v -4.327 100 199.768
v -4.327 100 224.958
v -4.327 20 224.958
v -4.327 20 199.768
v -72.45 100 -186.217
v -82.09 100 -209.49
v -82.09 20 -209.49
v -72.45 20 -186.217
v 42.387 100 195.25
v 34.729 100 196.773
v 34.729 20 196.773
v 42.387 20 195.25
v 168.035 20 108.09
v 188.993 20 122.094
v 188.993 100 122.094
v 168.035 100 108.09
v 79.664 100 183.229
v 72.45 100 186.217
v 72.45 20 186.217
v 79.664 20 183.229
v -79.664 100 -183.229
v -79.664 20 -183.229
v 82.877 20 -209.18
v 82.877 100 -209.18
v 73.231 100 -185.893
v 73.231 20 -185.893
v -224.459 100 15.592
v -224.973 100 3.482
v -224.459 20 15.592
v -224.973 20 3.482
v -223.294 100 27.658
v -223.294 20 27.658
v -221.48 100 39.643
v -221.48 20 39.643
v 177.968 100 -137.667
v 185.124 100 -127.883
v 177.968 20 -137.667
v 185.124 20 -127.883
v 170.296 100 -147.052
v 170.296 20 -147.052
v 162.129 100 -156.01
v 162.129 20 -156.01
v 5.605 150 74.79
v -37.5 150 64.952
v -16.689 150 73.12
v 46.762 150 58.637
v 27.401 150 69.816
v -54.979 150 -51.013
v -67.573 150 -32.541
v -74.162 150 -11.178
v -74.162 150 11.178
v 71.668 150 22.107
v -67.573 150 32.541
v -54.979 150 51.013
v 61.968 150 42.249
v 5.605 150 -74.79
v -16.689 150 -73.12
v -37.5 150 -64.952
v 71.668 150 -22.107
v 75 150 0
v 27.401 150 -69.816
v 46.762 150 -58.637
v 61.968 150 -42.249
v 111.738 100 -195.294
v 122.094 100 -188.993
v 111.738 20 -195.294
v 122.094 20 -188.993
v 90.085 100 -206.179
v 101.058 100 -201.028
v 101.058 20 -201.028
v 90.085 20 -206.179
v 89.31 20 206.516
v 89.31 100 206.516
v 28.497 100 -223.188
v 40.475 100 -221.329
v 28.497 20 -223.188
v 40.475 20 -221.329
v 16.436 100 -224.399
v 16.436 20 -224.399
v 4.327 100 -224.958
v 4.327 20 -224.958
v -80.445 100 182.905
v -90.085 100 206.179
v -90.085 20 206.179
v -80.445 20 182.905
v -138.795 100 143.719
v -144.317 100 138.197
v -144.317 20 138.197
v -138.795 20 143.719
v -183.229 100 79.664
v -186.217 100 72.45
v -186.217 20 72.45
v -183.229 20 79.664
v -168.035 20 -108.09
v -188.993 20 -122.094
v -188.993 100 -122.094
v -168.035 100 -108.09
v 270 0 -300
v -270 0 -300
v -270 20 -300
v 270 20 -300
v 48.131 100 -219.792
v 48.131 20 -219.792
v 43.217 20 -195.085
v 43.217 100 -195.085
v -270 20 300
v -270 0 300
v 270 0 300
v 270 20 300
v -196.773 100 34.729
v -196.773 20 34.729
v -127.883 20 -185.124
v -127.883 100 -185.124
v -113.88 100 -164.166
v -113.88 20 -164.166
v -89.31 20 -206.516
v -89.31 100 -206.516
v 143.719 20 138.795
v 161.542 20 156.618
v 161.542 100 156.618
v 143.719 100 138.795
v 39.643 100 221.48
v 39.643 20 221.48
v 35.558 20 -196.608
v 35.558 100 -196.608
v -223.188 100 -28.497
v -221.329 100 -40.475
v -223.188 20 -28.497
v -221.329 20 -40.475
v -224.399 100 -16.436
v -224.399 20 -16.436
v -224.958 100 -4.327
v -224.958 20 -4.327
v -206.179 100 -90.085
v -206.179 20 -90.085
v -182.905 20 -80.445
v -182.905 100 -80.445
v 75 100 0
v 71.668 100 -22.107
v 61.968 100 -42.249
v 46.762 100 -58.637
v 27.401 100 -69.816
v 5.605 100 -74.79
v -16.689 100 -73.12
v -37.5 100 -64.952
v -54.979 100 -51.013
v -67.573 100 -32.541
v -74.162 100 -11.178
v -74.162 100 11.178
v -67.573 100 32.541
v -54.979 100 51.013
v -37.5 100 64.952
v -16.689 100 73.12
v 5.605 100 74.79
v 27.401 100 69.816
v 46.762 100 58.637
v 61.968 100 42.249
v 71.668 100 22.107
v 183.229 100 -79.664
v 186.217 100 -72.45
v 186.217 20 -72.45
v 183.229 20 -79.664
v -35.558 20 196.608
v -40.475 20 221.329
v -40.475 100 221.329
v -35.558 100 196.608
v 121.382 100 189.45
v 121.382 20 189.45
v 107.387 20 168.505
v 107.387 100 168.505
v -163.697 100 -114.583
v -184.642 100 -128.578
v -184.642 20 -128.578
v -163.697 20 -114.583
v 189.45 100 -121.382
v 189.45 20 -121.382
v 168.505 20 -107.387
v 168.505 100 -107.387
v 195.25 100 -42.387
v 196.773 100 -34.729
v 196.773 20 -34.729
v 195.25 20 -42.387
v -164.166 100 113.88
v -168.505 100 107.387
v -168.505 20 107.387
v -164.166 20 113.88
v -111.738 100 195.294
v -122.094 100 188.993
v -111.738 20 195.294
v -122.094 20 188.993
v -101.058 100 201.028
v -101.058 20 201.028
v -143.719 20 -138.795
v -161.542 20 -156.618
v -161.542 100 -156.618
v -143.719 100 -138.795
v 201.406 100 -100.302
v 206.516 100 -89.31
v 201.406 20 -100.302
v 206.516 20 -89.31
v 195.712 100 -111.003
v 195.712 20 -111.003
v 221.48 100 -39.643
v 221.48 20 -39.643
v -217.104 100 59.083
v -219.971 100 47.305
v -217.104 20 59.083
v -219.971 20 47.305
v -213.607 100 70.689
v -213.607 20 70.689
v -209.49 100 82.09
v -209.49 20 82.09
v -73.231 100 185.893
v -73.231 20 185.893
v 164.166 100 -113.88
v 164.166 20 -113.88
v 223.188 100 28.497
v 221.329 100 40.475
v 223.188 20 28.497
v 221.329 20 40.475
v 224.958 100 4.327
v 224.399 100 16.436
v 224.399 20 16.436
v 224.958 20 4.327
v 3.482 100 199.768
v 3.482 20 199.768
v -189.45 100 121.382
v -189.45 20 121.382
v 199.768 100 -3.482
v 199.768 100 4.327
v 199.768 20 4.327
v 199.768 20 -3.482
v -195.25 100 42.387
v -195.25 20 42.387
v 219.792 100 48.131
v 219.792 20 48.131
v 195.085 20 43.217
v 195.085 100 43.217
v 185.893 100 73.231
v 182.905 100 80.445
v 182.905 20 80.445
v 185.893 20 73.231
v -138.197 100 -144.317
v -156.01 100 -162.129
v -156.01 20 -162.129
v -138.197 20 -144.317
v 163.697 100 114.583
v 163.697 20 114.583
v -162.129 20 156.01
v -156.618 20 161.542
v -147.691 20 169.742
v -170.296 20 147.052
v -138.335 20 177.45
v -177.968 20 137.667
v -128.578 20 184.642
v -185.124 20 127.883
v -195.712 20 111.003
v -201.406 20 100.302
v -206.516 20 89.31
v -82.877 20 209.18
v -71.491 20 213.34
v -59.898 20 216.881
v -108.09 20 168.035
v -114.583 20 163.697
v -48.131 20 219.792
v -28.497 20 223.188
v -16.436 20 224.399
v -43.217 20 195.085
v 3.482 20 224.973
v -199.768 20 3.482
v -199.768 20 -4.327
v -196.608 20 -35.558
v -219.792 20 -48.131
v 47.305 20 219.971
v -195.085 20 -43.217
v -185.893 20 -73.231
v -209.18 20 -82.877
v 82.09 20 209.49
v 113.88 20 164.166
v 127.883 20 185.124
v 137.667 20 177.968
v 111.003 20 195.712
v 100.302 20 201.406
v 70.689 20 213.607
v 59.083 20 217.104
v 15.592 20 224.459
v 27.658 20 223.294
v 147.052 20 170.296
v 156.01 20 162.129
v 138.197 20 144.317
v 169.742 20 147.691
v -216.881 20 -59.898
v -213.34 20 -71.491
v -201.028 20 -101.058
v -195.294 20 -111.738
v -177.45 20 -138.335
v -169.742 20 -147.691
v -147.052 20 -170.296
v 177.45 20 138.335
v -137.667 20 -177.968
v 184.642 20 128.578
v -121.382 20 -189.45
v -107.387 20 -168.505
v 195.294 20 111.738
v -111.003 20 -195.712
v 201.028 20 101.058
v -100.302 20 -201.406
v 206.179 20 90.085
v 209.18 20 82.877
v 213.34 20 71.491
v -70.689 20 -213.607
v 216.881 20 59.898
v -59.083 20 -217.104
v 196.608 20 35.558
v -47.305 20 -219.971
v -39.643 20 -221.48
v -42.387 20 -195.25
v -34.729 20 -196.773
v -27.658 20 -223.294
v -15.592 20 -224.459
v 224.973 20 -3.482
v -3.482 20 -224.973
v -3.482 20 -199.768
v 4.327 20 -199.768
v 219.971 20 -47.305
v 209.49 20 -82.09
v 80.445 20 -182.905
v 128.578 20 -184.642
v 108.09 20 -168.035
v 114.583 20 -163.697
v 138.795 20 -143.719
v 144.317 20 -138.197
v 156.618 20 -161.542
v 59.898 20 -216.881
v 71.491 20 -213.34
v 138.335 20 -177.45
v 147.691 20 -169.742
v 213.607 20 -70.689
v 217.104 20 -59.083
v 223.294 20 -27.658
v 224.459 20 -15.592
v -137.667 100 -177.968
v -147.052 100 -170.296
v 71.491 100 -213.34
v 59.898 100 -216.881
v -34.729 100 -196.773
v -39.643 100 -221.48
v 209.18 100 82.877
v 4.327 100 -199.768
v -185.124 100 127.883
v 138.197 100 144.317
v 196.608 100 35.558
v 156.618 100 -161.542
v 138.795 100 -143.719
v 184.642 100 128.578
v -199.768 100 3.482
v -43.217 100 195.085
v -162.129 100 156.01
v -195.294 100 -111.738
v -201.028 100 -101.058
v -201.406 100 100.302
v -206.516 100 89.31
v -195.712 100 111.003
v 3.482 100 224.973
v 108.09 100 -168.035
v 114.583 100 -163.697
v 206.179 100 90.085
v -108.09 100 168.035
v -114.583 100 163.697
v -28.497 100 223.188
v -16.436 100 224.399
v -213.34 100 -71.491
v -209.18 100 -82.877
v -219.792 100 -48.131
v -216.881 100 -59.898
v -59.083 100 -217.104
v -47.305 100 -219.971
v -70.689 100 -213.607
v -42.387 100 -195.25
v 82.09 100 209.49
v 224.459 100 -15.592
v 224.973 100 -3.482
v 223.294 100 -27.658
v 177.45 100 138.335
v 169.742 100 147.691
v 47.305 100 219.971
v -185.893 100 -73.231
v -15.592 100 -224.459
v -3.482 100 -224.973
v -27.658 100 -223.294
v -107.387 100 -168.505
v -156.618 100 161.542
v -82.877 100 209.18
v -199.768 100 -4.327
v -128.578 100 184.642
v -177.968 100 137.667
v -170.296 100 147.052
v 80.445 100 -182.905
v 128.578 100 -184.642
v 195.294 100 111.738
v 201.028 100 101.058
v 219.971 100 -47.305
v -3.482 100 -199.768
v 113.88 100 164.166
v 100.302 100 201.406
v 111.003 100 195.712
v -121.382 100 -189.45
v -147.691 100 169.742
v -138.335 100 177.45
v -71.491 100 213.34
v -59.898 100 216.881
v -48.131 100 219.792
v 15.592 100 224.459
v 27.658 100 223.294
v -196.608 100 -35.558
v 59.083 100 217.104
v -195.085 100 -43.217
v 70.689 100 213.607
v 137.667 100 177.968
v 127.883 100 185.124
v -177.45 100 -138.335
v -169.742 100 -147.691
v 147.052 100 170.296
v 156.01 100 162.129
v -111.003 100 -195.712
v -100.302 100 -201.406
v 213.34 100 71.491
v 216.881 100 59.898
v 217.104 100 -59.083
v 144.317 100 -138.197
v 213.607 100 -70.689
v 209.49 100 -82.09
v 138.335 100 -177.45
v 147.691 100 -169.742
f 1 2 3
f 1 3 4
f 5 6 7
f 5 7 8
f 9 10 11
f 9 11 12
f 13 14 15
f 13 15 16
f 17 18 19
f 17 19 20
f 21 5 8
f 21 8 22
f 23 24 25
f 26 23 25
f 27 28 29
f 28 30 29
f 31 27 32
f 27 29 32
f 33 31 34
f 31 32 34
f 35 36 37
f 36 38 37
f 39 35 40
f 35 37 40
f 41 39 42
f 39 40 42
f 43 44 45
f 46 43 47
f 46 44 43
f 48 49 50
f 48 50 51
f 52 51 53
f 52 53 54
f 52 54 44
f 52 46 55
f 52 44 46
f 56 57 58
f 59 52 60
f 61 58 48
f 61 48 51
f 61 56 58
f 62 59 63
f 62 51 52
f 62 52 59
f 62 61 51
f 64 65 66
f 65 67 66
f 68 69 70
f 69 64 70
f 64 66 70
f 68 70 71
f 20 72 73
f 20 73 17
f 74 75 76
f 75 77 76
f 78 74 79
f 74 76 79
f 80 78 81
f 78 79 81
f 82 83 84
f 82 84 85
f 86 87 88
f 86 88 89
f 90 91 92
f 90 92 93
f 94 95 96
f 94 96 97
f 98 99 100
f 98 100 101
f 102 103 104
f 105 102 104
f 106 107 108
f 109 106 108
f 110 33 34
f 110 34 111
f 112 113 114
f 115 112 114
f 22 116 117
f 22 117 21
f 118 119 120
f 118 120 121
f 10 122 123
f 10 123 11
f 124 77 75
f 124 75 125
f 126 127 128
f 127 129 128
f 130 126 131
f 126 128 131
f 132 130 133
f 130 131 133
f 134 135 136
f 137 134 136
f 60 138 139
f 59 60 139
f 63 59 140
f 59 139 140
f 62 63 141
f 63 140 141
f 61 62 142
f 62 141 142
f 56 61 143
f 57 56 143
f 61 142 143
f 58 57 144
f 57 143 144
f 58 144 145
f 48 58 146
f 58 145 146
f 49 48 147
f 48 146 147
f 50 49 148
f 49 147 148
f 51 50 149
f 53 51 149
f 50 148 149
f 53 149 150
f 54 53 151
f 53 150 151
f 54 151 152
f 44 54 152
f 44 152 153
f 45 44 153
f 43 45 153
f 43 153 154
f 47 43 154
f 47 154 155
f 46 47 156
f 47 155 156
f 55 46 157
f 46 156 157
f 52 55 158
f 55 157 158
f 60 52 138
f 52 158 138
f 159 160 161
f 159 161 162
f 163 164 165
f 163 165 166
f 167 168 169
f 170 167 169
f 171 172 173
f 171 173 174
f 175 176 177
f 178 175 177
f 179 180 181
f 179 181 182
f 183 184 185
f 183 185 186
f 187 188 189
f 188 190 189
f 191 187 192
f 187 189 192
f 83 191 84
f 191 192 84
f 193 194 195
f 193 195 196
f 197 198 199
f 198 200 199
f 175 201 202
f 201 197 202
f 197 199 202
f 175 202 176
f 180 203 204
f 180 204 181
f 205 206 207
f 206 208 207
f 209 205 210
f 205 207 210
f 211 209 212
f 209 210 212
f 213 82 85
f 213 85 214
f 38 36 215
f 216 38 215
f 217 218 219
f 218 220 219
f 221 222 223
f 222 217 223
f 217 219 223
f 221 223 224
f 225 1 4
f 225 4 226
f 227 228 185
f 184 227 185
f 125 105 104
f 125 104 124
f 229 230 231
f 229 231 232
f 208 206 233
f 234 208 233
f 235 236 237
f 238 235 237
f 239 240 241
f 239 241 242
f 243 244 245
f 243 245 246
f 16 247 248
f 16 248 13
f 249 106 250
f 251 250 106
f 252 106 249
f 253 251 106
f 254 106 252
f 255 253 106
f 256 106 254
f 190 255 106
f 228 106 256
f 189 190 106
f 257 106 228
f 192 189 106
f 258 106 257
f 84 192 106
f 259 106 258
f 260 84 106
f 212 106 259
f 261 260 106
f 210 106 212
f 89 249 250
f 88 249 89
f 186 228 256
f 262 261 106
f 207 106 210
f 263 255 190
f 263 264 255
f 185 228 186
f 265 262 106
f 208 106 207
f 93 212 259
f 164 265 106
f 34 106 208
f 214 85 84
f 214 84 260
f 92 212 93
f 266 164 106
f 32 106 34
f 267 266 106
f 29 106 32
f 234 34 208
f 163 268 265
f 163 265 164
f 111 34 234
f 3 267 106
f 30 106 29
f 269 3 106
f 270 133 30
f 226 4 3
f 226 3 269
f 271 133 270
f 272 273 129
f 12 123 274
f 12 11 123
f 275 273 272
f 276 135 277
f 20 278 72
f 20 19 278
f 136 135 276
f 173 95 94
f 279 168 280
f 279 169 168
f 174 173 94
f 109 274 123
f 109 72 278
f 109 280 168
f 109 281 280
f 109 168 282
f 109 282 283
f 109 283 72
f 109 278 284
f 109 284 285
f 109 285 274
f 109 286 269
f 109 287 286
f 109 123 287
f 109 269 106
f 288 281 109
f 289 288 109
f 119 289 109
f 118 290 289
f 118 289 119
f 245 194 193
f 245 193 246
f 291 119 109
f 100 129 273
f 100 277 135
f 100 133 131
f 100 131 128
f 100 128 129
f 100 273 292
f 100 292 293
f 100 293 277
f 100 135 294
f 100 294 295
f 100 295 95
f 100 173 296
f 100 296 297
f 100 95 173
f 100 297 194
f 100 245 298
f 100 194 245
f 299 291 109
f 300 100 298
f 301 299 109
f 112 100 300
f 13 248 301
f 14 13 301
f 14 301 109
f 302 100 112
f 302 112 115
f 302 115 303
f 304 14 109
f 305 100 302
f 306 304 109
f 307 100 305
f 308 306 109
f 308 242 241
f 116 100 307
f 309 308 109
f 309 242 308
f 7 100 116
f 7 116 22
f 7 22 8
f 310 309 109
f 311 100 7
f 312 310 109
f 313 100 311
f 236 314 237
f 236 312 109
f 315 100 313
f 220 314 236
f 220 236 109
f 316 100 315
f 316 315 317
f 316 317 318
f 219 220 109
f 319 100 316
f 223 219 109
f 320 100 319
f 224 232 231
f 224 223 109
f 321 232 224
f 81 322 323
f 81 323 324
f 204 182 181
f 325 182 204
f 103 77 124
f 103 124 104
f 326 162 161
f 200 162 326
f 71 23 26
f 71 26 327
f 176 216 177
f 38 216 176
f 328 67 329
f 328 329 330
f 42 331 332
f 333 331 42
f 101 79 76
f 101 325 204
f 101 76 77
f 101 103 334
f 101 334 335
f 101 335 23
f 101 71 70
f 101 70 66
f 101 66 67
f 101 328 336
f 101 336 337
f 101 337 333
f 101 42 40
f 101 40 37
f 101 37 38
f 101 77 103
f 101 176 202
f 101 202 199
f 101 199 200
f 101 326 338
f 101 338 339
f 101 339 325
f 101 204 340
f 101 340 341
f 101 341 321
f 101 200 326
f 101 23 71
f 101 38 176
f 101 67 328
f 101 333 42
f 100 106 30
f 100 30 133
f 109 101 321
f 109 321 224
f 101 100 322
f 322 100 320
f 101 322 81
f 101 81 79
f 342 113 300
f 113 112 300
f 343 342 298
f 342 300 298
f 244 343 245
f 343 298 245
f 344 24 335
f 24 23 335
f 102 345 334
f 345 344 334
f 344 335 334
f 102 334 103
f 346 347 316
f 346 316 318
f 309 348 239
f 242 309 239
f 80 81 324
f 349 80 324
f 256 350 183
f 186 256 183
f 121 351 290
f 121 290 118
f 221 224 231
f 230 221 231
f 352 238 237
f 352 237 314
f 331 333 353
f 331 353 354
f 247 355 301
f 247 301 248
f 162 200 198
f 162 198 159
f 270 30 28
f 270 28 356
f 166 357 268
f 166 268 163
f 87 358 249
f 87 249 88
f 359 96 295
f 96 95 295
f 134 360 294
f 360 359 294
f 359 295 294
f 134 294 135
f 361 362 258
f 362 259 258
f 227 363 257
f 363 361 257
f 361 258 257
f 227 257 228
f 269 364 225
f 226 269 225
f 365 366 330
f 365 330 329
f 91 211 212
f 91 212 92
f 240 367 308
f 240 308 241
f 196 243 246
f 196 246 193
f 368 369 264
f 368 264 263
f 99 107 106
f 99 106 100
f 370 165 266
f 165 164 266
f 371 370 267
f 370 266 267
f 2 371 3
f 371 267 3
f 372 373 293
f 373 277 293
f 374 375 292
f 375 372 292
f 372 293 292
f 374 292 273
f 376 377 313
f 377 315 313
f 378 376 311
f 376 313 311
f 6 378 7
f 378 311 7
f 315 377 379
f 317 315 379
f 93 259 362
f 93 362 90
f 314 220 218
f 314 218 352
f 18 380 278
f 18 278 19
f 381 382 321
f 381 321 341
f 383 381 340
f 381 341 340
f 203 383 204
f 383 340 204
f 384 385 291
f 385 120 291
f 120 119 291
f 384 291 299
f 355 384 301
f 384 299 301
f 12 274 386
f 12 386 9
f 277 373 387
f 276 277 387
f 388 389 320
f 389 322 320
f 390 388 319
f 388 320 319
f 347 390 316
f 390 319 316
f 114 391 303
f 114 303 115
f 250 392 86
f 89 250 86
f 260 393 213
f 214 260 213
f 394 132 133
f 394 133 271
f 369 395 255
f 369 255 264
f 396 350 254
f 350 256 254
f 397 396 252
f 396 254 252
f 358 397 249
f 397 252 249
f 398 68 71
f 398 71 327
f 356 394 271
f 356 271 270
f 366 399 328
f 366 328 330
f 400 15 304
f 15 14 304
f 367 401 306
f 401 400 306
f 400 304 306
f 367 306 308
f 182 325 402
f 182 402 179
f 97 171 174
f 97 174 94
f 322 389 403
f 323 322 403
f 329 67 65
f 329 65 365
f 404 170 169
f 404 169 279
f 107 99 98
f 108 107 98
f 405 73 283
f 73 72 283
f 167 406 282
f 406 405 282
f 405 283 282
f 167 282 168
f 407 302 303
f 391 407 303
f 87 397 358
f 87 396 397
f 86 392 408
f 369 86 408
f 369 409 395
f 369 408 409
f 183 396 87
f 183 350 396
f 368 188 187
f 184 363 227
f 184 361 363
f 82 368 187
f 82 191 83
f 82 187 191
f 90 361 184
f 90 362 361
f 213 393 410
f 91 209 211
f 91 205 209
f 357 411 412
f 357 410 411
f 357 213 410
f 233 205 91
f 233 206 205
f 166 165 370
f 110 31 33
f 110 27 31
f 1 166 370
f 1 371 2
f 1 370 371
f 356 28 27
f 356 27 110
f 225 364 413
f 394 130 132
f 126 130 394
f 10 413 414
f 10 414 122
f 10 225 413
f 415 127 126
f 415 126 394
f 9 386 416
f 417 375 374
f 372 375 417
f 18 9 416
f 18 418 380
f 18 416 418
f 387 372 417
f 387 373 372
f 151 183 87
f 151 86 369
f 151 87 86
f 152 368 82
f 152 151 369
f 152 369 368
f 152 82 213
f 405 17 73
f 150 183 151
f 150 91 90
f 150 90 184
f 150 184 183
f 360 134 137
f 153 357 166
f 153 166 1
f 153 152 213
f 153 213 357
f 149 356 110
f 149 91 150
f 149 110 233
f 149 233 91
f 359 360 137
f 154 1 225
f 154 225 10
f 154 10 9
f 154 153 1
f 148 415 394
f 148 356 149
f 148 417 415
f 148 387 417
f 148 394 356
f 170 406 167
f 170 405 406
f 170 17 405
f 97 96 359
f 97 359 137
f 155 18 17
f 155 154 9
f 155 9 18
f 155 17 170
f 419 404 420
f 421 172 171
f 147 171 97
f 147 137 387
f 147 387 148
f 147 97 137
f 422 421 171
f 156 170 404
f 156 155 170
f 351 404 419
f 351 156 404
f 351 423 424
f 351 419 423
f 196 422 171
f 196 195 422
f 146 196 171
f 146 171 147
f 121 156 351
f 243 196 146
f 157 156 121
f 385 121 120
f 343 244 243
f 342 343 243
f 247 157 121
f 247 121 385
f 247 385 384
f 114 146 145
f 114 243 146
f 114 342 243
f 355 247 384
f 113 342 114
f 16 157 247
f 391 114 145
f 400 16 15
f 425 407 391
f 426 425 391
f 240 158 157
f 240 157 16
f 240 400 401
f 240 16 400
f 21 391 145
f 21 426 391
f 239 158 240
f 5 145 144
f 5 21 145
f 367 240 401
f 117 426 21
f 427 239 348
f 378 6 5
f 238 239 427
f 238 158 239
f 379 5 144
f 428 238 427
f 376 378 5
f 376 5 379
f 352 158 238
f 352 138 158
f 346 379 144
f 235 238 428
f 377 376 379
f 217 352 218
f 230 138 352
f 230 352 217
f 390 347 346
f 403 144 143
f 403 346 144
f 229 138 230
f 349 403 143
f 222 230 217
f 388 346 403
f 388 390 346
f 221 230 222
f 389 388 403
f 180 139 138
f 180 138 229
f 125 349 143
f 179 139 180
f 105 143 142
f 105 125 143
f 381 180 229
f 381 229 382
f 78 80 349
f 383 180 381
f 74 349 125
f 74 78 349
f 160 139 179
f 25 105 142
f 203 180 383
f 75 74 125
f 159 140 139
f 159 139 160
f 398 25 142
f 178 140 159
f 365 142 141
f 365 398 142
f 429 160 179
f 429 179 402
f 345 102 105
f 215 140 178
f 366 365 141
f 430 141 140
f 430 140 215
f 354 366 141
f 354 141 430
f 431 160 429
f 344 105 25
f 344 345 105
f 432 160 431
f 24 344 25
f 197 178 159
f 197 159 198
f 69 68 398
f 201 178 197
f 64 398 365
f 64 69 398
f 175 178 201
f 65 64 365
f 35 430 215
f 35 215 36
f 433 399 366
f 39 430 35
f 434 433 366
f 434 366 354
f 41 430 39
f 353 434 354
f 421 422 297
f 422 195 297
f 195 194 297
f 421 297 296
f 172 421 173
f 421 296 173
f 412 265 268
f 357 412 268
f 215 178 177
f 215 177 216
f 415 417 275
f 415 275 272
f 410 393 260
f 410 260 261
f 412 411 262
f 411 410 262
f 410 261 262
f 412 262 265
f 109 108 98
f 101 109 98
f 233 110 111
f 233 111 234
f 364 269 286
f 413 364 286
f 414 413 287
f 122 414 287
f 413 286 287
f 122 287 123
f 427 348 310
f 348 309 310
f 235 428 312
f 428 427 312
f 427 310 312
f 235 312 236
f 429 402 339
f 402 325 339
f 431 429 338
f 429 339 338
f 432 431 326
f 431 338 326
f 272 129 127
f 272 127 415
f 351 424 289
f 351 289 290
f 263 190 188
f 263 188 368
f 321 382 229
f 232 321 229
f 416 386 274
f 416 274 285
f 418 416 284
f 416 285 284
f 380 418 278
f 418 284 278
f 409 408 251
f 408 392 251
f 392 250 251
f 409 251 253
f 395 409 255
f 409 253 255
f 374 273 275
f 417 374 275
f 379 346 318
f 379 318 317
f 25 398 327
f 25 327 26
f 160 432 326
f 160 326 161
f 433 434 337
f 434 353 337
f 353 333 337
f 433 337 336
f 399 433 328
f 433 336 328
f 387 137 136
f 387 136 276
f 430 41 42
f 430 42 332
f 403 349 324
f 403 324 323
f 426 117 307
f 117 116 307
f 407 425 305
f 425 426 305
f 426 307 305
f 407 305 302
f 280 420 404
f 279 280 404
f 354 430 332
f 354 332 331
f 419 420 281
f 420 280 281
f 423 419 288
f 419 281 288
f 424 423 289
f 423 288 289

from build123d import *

# Parameters (mm, degrees)
SKETCH1_W           = 540
SKETCH1_H           = 600
BOSS_EXTRUDE1_DEPTH = 20
SKETCH2_R           = 225
BOSS_EXTRUDE2_DEPTH = 80
SKETCH3_R           = 75
BOSS_EXTRUDE3_DEPTH = 50
SKETCH4_W           = 7.808552915
SKETCH4_H           = 30.411045622
CUT_EXTRUDE2_DEPTH  = 80
CIRPATTERN1_COUNT   = 32


with BuildPart() as part:
    # Sketch1 → Boss-Extrude1 (new body)
    with BuildSketch(Plane(origin=(0, 0, 0), x_dir=(1, 0, 0), z_dir=(0, 1, 0))):
        Rectangle(SKETCH1_W, SKETCH1_H)
    extrude(amount=BOSS_EXTRUDE1_DEPTH)

    # Sketch2 → Boss-Extrude2 (add)
    with BuildSketch(Plane(origin=(0, 20, 0), x_dir=(1, 0, 0), z_dir=(0, 1, 0))):
        Circle(SKETCH2_R)
    extrude(amount=BOSS_EXTRUDE2_DEPTH)

    # Sketch3 → Boss-Extrude3 (add)
    with BuildSketch(Plane(origin=(0, 100, 0), x_dir=(1, 0, 0), z_dir=(0, 1, 0))):
        Circle(SKETCH3_R)
    extrude(amount=BOSS_EXTRUDE3_DEPTH)

    # Sketch4 → Cut-Extrude2 (cut)
    with BuildSketch(Plane(origin=(0, 100, 0), x_dir=(1, 0, 0), z_dir=(0, 1, 0))):
        with Locations((-0.422697027, -214.97303666)):
            Rectangle(SKETCH4_W, SKETCH4_H)
    cut_extrude2 = extrude(amount=-CUT_EXTRUDE2_DEPTH, mode=Mode.SUBTRACT)

    # CirPattern1: Cut-Extrude2 ×32 about axis
    cirpattern1_axis = Axis((0, 0, 0), (0, 1, 0))
    for i in range(1, CIRPATTERN1_COUNT):
        add(cut_extrude2.rotate(cirpattern1_axis, i * 360 / CIRPATTERN1_COUNT), mode=Mode.SUBTRACT)


solid = part.part
